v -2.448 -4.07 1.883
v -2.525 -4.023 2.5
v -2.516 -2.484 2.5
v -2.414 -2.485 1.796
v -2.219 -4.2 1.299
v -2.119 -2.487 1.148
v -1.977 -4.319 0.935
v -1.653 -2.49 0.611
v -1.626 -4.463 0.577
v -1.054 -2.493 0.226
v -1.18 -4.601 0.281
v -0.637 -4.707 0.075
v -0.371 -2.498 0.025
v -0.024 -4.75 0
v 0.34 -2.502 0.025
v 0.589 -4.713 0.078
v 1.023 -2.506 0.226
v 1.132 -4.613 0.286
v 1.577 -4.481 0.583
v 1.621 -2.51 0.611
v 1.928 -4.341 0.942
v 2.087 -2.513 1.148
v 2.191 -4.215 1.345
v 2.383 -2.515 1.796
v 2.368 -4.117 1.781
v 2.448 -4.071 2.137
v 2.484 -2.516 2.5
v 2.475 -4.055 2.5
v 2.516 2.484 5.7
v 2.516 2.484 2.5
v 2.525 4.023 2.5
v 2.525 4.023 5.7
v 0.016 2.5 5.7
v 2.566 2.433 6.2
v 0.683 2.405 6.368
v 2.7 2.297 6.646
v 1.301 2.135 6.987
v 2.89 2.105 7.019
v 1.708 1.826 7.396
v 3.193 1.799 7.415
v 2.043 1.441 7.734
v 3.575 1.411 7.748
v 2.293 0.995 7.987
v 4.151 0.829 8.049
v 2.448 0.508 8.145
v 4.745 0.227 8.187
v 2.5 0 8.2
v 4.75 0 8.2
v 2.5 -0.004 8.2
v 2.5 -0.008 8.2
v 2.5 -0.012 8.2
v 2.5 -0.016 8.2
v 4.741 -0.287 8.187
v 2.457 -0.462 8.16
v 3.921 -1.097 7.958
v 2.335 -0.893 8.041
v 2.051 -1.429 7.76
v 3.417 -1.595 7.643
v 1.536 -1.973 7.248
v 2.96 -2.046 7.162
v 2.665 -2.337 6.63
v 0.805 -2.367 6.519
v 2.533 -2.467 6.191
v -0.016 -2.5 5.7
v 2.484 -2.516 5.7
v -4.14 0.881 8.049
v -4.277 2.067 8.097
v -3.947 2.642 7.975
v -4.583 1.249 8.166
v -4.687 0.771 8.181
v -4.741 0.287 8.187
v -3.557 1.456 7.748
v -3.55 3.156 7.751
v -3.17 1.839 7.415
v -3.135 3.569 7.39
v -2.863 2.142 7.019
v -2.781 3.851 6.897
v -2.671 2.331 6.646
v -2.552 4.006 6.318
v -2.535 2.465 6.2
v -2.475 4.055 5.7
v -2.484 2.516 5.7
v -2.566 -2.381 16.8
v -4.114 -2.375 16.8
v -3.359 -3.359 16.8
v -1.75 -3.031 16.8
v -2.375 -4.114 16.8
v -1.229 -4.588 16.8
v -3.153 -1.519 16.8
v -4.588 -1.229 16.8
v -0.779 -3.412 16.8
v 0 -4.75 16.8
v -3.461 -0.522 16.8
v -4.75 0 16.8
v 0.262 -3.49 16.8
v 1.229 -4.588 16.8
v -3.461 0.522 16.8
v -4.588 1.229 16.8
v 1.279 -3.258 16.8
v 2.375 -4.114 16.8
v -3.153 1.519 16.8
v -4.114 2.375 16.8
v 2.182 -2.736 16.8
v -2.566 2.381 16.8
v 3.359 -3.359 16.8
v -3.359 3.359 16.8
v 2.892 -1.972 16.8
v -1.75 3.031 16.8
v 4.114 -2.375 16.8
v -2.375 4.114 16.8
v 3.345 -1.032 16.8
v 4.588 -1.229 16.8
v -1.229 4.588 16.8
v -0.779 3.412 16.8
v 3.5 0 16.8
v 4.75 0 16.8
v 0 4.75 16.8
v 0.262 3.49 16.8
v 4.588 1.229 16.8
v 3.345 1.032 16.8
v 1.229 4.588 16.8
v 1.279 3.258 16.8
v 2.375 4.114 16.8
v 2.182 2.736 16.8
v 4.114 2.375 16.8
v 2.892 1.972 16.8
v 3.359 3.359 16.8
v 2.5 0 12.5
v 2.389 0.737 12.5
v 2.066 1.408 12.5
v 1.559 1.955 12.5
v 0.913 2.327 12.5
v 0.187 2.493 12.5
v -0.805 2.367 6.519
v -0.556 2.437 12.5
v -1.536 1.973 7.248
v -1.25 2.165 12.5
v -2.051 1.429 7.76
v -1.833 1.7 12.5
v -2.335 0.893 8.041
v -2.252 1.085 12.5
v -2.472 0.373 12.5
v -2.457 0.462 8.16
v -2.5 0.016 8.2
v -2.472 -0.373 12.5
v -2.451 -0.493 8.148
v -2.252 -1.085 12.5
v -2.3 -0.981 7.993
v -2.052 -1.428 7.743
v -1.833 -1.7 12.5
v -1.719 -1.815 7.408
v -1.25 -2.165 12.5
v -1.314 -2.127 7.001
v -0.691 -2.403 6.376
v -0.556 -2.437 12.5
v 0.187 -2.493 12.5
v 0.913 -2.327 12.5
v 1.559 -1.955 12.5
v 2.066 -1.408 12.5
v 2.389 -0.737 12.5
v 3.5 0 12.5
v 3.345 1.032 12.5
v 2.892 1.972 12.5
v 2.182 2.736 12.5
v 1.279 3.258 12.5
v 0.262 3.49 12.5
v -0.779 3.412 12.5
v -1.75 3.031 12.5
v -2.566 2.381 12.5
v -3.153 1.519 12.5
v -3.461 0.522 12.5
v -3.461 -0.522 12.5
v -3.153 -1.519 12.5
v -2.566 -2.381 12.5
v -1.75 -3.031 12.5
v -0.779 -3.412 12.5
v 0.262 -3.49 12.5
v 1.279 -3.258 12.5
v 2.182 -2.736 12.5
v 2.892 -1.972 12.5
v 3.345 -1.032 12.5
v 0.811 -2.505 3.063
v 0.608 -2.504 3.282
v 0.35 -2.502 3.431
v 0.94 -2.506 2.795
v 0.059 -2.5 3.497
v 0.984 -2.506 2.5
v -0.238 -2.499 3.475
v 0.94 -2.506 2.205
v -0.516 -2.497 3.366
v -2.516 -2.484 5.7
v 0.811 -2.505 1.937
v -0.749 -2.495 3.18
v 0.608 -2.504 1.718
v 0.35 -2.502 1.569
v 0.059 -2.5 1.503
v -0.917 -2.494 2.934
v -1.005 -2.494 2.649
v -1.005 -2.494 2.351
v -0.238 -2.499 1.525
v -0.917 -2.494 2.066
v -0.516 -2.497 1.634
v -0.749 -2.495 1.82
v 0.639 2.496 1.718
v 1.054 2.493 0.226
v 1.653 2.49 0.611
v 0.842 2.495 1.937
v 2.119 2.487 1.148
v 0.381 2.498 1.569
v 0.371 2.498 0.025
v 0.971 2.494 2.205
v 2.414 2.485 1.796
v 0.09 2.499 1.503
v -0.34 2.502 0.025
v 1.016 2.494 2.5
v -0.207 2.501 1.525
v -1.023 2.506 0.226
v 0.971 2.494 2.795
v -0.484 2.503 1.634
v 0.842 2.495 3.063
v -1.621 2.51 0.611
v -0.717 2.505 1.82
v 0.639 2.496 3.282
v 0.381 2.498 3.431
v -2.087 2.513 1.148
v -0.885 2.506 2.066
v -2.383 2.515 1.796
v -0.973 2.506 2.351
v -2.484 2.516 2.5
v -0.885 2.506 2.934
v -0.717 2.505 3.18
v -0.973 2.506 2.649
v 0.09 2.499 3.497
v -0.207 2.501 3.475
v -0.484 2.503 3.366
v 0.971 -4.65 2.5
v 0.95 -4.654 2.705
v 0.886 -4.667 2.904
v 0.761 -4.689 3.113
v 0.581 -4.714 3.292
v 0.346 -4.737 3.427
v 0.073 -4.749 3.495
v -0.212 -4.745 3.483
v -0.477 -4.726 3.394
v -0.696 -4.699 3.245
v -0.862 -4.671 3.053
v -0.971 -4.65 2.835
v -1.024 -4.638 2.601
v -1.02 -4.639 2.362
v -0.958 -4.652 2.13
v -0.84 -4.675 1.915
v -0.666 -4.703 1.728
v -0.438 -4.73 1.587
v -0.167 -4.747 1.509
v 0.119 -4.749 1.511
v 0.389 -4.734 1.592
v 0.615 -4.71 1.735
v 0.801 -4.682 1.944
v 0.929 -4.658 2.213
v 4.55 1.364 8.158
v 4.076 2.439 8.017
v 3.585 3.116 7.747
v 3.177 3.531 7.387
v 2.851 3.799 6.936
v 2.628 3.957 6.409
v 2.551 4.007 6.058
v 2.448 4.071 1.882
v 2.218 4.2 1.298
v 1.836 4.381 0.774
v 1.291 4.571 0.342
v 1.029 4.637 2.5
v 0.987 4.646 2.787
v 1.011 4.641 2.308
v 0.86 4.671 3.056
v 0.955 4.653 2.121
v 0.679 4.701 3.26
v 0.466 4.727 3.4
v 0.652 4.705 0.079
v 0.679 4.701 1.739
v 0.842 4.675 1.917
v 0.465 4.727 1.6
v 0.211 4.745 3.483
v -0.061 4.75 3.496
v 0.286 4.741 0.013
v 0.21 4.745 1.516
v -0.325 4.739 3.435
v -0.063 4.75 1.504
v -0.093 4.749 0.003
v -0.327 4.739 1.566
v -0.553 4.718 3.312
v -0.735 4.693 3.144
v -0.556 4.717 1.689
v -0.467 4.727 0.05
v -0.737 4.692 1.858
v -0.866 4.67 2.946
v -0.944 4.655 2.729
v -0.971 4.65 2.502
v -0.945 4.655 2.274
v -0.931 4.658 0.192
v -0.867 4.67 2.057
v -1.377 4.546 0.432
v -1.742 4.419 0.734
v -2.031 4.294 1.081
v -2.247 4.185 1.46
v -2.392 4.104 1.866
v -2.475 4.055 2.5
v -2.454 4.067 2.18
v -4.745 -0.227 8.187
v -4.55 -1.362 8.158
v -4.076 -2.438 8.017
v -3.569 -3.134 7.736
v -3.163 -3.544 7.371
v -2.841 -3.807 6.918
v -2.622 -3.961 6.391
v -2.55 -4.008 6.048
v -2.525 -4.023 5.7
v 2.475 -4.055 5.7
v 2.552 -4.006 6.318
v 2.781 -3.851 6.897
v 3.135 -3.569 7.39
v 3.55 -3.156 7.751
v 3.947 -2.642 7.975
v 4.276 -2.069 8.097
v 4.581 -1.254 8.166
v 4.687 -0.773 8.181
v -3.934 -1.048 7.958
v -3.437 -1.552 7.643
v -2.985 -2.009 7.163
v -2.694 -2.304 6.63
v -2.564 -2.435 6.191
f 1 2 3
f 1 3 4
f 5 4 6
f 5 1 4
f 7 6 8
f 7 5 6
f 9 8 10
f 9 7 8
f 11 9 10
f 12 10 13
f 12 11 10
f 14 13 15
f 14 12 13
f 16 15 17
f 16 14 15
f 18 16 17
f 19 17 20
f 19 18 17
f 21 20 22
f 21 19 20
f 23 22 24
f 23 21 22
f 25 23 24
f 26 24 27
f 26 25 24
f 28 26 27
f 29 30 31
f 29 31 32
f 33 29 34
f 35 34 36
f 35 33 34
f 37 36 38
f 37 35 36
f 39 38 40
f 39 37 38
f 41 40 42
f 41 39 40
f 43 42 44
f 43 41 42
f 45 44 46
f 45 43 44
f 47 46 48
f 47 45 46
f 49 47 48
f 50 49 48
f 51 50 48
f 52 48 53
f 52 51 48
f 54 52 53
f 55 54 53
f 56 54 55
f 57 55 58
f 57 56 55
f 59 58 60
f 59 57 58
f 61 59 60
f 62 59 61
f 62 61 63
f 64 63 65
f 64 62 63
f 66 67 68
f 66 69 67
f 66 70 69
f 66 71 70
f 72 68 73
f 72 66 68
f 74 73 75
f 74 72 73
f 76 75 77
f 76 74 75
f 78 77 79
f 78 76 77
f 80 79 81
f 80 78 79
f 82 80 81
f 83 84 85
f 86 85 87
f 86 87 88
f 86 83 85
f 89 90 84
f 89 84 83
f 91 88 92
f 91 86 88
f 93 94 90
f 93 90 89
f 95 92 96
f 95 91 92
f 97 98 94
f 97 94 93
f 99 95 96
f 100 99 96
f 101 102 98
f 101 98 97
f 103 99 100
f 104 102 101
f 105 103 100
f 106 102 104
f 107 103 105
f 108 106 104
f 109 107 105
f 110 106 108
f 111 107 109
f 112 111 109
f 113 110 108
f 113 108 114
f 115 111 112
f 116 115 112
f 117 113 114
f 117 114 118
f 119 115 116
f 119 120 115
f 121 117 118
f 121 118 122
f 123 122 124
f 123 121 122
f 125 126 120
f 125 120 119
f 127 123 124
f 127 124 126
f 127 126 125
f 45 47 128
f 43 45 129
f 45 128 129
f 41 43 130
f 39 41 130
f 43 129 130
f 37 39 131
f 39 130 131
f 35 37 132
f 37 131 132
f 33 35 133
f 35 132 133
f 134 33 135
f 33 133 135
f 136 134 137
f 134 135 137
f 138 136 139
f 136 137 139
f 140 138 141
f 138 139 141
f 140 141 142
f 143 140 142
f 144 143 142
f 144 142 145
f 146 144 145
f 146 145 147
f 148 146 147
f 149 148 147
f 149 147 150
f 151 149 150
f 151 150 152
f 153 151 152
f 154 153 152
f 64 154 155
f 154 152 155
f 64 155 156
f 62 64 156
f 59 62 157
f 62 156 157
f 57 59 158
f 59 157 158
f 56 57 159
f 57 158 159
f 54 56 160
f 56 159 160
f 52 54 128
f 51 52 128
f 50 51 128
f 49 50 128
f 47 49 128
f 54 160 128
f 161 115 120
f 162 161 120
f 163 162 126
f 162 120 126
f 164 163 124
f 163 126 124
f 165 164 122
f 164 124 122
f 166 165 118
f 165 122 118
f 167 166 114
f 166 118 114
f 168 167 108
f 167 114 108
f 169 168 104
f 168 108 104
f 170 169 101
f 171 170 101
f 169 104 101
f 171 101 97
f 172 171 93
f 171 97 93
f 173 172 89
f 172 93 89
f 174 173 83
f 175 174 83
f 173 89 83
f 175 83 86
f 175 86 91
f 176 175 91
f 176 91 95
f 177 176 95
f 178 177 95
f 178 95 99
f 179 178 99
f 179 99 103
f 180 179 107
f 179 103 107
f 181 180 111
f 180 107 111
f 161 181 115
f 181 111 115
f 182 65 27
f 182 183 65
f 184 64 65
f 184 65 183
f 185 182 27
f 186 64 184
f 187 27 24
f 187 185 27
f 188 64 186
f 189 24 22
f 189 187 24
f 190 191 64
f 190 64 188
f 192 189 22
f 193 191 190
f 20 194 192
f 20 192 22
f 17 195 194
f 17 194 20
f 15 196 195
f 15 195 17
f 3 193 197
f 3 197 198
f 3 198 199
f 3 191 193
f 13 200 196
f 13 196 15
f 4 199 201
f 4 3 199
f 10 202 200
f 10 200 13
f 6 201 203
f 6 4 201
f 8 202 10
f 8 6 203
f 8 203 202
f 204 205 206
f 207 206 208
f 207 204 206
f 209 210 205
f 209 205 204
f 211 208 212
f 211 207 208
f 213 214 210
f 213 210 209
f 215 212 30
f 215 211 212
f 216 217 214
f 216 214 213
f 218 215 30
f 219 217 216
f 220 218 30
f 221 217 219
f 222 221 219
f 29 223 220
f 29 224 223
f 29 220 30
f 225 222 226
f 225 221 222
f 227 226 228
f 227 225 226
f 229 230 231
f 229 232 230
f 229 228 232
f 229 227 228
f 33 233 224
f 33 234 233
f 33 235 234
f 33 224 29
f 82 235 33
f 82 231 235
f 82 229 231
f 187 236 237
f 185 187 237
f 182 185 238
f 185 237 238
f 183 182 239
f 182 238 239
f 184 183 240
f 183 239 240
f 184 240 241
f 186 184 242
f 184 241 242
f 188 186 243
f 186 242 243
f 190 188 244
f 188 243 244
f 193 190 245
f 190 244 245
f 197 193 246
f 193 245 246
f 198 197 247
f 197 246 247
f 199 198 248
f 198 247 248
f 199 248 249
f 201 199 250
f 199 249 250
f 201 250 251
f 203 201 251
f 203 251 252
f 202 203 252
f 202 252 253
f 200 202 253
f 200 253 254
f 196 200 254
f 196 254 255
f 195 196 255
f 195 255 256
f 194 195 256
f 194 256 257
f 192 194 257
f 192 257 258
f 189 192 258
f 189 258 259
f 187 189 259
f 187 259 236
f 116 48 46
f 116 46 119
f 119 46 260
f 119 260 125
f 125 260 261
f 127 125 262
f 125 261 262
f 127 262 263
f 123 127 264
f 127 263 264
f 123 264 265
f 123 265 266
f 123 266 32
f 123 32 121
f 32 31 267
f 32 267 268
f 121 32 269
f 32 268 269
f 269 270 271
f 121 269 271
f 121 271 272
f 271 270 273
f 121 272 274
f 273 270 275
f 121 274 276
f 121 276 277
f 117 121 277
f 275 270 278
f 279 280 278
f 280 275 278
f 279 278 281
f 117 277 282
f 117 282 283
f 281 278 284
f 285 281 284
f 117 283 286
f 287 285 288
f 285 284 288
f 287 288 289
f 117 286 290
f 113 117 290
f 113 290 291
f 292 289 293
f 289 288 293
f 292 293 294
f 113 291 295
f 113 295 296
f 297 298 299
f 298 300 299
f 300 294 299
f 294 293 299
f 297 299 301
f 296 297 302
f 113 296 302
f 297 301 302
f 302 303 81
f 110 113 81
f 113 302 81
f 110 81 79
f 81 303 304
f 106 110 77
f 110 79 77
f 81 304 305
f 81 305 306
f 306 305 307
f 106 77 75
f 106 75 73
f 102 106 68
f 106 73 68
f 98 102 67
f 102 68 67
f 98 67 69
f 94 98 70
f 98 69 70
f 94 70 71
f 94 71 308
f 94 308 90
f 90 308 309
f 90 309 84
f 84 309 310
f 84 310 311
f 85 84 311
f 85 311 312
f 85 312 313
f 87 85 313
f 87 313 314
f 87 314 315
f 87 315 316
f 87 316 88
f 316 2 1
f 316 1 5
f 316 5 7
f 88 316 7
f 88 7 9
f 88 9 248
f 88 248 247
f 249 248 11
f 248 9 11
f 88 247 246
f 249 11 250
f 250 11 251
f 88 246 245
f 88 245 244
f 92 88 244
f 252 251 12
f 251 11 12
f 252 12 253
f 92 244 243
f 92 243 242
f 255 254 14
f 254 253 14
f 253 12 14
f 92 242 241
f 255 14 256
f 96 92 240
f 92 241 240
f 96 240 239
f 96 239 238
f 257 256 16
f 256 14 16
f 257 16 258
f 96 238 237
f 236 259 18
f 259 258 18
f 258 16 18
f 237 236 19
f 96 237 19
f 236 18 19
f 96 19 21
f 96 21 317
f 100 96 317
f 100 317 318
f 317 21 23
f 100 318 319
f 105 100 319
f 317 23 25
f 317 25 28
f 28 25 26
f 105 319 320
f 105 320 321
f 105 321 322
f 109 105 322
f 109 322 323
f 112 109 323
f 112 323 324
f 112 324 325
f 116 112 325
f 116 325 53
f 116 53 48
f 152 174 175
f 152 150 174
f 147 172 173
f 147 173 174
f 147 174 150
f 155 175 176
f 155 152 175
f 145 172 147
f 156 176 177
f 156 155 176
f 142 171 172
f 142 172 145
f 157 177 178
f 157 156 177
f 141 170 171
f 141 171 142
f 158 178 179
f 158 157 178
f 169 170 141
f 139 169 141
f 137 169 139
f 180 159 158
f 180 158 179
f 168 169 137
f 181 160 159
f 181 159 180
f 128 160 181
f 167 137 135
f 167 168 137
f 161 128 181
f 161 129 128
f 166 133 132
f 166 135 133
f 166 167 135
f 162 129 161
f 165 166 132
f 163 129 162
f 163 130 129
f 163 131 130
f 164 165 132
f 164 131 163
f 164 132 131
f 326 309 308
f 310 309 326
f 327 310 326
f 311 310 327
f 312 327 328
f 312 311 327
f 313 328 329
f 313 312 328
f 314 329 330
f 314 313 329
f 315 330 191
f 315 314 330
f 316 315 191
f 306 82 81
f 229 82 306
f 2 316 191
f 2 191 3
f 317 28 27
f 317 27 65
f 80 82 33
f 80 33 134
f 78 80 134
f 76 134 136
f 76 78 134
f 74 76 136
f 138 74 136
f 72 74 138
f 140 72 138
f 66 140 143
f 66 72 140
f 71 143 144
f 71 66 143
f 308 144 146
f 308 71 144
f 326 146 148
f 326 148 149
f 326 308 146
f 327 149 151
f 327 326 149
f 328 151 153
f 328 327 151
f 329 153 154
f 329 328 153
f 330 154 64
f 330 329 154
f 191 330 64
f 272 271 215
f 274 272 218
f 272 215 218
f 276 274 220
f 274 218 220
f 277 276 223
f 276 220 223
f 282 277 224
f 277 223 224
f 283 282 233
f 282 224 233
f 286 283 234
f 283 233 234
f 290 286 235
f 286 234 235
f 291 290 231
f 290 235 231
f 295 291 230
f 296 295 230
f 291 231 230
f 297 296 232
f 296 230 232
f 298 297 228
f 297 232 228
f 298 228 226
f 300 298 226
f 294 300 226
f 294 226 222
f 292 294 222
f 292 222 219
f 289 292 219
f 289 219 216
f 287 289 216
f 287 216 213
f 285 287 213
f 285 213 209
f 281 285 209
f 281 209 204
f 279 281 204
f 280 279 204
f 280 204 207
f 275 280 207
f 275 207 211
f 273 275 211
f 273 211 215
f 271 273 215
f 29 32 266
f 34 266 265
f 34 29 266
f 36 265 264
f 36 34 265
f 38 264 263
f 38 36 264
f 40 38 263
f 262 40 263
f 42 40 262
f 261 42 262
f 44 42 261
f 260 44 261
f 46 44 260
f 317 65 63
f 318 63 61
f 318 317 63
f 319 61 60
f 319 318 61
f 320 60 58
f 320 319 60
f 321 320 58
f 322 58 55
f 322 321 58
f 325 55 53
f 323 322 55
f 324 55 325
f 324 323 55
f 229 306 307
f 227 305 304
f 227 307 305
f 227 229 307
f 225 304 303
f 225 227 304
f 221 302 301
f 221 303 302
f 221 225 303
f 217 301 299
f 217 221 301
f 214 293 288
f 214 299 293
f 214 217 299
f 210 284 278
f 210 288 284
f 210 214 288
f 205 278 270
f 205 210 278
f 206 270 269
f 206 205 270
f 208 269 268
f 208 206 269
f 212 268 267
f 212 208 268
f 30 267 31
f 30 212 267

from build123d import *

# Parameters (mm, degrees)
ESQUISSE1_R             = 4.75
BOSS_EXTRU_1_DEPTH      = 16.8
ESQUISSE2_R             = 3.5
ENL_V_MAT_EXTRU_1_DEPTH = 4.3
ESQUISSE3_R             = 2.5
ENL_V_MAT_EXTRU_2_DEPTH = 15.190665946
ENL_V_MAT_EXTRU_3_DEPTH = 20.883036391
ENL_V_MAT_EXTRU_4_DEPTH = 20.883036548
ESQUISSE6_R             = 1
ENL_V_MAT_EXTRU_5_DEPTH = 20.883036548


with BuildPart() as part:
    # Esquisse1 → Boss.-Extru.1 (new body)
    with BuildSketch(Plane.XY):
        Circle(ESQUISSE1_R)
    extrude(amount=BOSS_EXTRU_1_DEPTH)

    # Esquisse2 → Enlèv. mat.-Extru.1 (cut)
    with BuildSketch(Plane.XY.offset(16.8)):
        Circle(ESQUISSE2_R)
    extrude(amount=-ENL_V_MAT_EXTRU_1_DEPTH, mode=Mode.SUBTRACT)

    # Esquisse3 → Enlèv. mat.-Extru.2 (cut, through all)
    with BuildSketch(Plane.XY.offset(12.5)):
        Circle(ESQUISSE3_R)
    extrude(amount=-ENL_V_MAT_EXTRU_2_DEPTH, mode=Mode.SUBTRACT)

    # Esquisse4 → Enlèv. mat.-Extru.3 (cut, through all)
    with BuildSketch(Plane(origin=(-4.749906239, 0.029844934, 0), x_dir=(0, 0, 1), z_dir=(-0.9999802608561372, 0.006283143965558955, 0))):
        with BuildLine():
            Line((0, 2.5), (5.7, 2.5))
            ThreePointArc((5.7, 2.5), (8.2, 0), (5.7, -2.5))
            Line((5.7, -2.5), (0, -2.5))
            Line((0, -2.5), (0, 2.5))
        make_face()
    extrude(amount=-ENL_V_MAT_EXTRU_3_DEPTH, mode=Mode.SUBTRACT)

    # Esquisse5 → Enlèv. mat.-Extru.4 (cut, through all)
    with BuildSketch(Plane(origin=(-0.029844934, -4.749906239, 0), x_dir=(0.9999802608561372, -0.006283143965558958, 0), z_dir=(-0.006283143965558958, -0.9999802608561372, 0))):
        with BuildLine():
            Line((5, 8.2), (8.5, 8.2))
            Line((8.5, 8.2), (8.5, -0.8))
            Line((8.5, -0.8), (-6.868883302, -0.8))
            Line((-6.868883302, -0.8), (-6.868883302, 8.2))
            Line((-6.868883302, 8.2), (-5, 8.2))
            ThreePointArc((-5, 8.2), (-3.232233047, 7.467766953), (-2.5, 5.7))
            Line((-2.5, 5.7), (-2.5, 2.5))
            ThreePointArc((-2.5, 2.5), (0, 0), (2.5, 2.5))
            Line((2.5, 2.5), (2.5, 5.7))
            ThreePointArc((2.5, 5.7), (3.232233047, 7.467766953), (5, 8.2))
        make_face()
    extrude(amount=-ENL_V_MAT_EXTRU_4_DEPTH, mode=Mode.SUBTRACT)

    # Esquisse6 → Enlèv. mat.-Extru.5 (cut, through all)
    with BuildSketch(Plane(origin=(-0.029844934, -4.749906239, 0), x_dir=(0.9999802608561372, -0.006283143965558958, 0), z_dir=(-0.006283143965558958, -0.9999802608561372, 0))):
        with Locations((0, 2.5)):
            Circle(ESQUISSE6_R)
    extrude(amount=-ENL_V_MAT_EXTRU_5_DEPTH, mode=Mode.SUBTRACT)


solid = part.part
